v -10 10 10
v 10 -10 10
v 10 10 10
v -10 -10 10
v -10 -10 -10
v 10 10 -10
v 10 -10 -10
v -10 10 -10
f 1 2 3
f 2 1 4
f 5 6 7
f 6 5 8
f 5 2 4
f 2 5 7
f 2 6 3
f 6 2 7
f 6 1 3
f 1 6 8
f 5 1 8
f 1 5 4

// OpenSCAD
// No minkowski() anywhere: the term must be 0 and the tight tolerance kept.
$fa = 2; $fs = 0.3;
cube([20, 20, 20], center = true);
